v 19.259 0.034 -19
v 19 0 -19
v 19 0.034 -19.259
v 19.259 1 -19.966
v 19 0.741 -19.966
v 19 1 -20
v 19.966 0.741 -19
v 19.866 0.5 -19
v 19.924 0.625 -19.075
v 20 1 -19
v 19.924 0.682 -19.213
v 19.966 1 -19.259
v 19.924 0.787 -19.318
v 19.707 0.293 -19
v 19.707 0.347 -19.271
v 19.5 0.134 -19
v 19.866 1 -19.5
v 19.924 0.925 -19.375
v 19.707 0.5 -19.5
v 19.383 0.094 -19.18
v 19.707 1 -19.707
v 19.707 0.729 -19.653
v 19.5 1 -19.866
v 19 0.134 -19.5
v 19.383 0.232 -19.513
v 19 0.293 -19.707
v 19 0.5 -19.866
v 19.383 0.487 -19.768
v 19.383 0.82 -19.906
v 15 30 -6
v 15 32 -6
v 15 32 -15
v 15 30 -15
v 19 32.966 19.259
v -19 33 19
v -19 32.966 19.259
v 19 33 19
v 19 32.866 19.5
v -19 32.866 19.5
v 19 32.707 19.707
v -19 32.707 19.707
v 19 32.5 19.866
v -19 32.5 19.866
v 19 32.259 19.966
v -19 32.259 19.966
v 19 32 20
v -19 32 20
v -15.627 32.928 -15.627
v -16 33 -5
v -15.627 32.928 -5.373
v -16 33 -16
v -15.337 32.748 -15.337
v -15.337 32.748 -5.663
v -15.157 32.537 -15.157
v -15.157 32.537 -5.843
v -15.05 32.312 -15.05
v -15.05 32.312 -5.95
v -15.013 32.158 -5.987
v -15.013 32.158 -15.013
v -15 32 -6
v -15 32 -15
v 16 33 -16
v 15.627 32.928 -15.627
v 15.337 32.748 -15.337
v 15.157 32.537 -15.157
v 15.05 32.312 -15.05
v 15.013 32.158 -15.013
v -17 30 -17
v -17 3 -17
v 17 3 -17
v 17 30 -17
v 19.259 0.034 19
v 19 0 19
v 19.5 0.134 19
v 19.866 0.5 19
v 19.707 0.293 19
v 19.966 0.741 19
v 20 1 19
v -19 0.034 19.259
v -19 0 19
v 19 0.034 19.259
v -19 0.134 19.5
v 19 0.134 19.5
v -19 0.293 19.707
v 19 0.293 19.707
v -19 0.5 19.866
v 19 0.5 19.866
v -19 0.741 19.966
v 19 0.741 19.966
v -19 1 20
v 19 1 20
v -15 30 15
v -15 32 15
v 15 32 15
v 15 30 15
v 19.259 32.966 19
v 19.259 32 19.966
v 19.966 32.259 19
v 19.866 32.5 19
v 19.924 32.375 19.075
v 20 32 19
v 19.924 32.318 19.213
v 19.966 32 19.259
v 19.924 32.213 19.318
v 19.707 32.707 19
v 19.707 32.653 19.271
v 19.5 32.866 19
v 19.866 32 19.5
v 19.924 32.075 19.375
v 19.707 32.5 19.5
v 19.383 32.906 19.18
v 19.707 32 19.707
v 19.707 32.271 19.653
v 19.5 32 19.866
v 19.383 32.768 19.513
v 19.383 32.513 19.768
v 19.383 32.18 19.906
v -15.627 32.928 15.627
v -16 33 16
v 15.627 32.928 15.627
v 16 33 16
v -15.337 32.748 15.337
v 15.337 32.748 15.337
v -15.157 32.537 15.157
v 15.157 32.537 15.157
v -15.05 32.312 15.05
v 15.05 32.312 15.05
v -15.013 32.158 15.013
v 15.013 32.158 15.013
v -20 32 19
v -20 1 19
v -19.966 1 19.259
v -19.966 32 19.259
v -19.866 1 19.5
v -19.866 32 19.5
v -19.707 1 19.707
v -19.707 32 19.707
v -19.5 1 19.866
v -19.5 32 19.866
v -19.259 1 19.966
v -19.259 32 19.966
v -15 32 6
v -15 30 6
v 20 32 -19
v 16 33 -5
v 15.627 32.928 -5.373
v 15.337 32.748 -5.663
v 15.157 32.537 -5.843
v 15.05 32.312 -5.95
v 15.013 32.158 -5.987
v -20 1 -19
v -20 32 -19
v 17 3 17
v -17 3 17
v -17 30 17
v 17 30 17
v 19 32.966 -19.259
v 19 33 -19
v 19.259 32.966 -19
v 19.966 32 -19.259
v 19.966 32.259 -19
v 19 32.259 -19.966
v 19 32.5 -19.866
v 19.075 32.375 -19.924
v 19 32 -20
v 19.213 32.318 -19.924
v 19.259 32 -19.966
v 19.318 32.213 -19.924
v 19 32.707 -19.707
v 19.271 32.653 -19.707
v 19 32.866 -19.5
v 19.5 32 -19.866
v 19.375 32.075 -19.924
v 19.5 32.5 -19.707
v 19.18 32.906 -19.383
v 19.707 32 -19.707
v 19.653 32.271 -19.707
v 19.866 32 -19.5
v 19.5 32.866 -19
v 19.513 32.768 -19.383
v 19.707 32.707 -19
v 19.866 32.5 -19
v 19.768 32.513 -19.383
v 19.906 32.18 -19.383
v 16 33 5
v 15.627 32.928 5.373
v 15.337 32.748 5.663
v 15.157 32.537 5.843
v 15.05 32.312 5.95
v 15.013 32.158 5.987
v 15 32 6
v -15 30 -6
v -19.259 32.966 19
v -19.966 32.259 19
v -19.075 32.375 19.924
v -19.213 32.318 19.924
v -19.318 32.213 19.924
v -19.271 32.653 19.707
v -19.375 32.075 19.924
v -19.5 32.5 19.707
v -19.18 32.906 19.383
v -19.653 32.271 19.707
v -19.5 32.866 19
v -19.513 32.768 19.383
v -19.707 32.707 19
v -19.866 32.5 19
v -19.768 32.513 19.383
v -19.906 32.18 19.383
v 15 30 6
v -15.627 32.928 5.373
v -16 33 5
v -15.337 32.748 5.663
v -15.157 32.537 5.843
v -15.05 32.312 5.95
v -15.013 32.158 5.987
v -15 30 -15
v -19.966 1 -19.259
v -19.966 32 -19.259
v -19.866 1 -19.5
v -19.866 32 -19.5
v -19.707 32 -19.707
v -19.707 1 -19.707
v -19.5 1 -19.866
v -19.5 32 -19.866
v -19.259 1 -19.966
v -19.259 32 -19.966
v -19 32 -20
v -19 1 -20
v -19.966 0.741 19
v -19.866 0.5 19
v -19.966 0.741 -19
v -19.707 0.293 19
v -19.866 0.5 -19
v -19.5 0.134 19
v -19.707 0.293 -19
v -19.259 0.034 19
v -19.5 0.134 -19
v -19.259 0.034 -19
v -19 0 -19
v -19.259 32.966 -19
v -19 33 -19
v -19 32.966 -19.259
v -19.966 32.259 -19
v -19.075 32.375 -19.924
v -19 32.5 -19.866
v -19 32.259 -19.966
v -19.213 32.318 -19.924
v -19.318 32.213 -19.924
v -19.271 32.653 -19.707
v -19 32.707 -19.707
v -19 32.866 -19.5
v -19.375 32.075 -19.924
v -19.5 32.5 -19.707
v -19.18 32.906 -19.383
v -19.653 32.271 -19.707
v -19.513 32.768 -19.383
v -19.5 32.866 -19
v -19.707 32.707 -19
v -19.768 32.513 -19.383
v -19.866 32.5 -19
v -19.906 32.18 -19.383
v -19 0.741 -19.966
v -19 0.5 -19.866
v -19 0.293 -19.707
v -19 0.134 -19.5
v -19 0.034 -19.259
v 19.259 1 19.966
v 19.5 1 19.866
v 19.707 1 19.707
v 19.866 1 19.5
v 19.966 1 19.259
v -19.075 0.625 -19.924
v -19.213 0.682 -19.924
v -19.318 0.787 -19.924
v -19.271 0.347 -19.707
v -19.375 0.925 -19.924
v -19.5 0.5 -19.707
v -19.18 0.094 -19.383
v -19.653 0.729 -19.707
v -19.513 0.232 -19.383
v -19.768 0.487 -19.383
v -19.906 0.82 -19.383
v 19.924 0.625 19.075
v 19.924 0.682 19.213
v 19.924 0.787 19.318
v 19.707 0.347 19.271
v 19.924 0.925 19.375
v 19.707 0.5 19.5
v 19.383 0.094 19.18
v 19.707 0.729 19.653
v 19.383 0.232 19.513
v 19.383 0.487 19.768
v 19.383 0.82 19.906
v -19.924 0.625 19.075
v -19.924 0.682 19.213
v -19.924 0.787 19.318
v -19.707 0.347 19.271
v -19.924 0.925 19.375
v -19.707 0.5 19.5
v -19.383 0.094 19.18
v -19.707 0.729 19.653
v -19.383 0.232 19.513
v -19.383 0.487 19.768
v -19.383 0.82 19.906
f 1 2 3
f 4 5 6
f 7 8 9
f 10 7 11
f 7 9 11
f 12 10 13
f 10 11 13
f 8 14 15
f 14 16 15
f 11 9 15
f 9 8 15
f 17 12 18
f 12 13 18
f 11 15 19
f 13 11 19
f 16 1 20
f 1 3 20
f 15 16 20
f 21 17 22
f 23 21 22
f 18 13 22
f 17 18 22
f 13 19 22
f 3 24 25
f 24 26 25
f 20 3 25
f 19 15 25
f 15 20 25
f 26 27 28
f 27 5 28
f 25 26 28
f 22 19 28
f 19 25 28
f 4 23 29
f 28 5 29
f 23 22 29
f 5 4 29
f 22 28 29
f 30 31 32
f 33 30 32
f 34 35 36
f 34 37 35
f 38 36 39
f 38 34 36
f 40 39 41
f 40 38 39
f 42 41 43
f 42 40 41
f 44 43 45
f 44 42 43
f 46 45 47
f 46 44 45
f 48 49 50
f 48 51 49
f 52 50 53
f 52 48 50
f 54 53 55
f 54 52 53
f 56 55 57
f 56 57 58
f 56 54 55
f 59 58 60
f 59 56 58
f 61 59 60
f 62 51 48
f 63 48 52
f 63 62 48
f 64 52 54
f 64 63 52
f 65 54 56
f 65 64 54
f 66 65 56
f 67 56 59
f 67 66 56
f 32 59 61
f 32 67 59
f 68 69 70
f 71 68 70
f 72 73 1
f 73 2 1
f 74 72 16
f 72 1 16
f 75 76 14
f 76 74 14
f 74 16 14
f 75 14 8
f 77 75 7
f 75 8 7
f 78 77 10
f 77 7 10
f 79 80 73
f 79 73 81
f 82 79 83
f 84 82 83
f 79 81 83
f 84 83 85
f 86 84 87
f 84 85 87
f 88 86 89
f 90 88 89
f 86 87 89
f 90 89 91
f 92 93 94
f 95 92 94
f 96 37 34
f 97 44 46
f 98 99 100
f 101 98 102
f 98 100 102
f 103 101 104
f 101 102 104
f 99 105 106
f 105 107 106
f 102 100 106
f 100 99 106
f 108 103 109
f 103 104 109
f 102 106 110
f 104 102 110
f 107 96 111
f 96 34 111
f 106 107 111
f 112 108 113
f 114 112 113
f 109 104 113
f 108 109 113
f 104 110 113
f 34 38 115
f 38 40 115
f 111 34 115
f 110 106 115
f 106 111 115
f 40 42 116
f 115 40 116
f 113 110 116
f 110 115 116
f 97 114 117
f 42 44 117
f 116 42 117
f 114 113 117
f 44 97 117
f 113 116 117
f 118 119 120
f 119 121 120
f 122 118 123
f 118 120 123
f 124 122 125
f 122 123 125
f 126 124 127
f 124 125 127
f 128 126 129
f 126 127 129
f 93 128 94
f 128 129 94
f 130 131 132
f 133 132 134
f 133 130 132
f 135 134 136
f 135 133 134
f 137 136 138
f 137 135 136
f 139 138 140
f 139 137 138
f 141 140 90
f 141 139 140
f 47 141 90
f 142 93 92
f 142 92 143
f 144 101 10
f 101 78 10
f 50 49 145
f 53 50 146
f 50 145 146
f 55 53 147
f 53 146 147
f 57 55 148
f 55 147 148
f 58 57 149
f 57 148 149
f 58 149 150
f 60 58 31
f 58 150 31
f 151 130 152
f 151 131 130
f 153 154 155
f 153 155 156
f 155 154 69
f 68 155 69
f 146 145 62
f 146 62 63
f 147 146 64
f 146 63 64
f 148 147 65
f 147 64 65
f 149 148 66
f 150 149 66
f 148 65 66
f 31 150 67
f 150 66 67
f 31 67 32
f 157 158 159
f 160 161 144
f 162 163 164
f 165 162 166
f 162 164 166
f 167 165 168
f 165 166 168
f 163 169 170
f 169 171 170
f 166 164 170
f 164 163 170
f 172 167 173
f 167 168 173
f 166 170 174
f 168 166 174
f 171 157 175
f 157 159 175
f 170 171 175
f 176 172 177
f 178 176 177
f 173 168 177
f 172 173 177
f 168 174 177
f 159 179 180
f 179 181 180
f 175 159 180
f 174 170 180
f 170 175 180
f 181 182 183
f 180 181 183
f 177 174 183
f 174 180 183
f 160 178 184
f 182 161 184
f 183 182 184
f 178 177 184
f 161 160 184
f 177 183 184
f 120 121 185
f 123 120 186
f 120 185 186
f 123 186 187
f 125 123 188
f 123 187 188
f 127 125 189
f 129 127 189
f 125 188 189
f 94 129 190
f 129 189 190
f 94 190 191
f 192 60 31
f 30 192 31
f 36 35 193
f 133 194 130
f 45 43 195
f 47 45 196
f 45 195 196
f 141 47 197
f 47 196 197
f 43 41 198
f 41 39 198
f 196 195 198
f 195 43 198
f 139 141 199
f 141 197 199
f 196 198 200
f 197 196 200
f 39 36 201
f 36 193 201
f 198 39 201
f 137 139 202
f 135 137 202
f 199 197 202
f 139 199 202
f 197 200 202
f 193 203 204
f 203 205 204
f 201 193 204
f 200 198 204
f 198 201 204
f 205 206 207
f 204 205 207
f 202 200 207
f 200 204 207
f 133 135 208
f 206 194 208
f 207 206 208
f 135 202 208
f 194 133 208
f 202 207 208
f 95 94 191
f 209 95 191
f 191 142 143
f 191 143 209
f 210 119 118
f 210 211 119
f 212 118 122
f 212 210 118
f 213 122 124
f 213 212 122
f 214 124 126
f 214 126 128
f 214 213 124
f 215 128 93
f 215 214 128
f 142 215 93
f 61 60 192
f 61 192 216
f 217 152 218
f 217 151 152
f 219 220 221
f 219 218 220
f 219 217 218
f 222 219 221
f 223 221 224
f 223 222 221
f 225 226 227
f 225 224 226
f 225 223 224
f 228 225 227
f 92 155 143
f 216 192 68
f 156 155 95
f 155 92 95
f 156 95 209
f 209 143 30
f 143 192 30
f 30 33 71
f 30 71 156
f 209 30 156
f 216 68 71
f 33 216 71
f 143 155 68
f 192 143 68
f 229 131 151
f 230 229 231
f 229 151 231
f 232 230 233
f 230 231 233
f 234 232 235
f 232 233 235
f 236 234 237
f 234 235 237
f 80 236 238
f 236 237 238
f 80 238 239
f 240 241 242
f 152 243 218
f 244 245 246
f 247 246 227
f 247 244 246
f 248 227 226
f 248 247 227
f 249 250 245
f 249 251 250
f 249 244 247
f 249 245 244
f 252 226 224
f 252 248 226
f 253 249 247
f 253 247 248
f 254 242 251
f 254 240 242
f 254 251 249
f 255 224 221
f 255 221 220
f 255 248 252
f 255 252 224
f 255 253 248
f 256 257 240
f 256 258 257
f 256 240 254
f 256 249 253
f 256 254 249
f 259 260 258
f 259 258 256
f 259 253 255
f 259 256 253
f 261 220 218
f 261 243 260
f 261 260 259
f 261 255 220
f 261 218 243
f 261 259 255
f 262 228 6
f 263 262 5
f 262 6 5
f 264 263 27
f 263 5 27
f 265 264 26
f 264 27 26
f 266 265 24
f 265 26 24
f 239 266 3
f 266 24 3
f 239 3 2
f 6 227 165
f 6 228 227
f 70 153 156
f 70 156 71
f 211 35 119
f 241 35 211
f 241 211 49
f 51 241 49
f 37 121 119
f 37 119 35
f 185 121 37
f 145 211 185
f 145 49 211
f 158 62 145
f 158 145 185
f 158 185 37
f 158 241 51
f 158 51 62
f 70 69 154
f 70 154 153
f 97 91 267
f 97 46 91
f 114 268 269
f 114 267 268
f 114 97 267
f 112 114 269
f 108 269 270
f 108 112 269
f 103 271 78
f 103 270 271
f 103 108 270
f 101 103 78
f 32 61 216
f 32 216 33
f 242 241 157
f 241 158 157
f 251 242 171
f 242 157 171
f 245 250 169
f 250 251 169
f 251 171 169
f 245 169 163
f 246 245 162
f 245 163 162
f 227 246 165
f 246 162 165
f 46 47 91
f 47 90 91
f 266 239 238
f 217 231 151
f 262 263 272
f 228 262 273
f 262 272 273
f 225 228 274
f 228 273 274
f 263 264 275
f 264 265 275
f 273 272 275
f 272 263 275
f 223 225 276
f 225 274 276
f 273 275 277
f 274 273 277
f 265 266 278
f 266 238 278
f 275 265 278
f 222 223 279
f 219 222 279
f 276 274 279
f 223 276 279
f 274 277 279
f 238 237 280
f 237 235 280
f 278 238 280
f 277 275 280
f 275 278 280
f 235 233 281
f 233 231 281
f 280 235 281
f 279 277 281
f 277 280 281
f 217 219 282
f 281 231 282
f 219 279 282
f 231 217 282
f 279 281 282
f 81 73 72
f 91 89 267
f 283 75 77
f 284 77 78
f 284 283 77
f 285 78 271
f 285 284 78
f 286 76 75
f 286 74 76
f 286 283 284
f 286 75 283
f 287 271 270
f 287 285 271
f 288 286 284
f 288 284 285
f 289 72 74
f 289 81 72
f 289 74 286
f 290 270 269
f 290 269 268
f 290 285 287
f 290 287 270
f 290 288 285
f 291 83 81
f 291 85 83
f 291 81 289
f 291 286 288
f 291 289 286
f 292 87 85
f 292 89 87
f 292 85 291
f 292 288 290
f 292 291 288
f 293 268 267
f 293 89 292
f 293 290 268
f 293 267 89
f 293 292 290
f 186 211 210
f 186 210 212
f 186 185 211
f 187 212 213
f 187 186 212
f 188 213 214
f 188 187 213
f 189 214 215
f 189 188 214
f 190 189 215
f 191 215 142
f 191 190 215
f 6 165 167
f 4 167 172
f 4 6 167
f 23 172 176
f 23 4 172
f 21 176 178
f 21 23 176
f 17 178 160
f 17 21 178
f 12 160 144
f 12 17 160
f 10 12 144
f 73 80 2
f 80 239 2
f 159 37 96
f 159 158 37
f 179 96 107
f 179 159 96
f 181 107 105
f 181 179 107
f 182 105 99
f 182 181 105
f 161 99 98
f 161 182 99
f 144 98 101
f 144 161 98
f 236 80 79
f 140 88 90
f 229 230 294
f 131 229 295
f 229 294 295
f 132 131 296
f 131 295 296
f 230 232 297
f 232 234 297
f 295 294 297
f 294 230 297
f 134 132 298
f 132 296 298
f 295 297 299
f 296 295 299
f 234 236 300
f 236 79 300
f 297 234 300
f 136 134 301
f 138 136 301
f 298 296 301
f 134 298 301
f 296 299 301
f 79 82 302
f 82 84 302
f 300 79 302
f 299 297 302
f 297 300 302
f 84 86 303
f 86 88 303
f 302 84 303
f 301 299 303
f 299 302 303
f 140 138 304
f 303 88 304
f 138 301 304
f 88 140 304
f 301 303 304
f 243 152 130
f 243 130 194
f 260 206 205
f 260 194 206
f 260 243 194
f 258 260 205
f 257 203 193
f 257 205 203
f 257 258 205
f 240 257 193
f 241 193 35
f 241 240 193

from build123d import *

# Parameters (mm, degrees)
SKETCH1_W           = 40
SKETCH1_H           = 40
BOSS_EXTRUDE1_DEPTH = 30
SHELL1_T            = -3
SKETCH2_W           = 40
SKETCH2_H           = 40
BOSS_EXTRUDE2_DEPTH = 3
SKETCH3_W           = 30
SKETCH3_H           = 9
CUT_EXTRUDE1_DEPTH  = 3
FILLET1_R           = 1


with BuildPart() as part:
    # Sketch1 → Boss-Extrude1 (new body)
    with BuildSketch(Plane(origin=(0, 0, 0), x_dir=(1, 0, 0), z_dir=(0, 1, 0))):
        Rectangle(SKETCH1_W, SKETCH1_H)
    extrude(amount=BOSS_EXTRUDE1_DEPTH)

    # Shell1
    shell1_openings = [part.faces().sort_by_distance(p)[0] for p in [
        (0, 30, 0),
    ]]
    offset(amount=SHELL1_T, openings=shell1_openings, kind=Kind.INTERSECTION)

    # Sketch2 → Boss-Extrude2 (add)
    with BuildSketch(Plane(origin=(0, 30, 0), x_dir=(1, 0, 0), z_dir=(0, 1, 0))):
        Rectangle(SKETCH2_W, SKETCH2_H)
    extrude(amount=BOSS_EXTRUDE2_DEPTH)

    # Sketch3 → Cut-Extrude1 (cut)
    with BuildSketch(Plane(origin=(0, 33, 0), x_dir=(1, 0, 0), z_dir=(0, 1, 0))):
        with Locations((0, -10.5)):
            Rectangle(SKETCH3_W, SKETCH3_H)
        with Locations((0, 10.5)):
            Rectangle(SKETCH3_W, SKETCH3_H)
    extrude(amount=-CUT_EXTRUDE1_DEPTH, mode=Mode.SUBTRACT)

    # Fillet1
    fillet1_edges = [part.edges().sort_by_distance(p)[0] for p in [
        (-20, 33, 0),
        (0, 33, 20),
        (20, 33, 0),
        (0, 33, -20),
        (0, 0, 20),
        (-15, 33, 10.5),
        (0, 33, 15),
        (15, 33, 10.5),
        (0, 33, 6),
        (-20, 0, 0),
        (-15, 33, -10.5),
        (0, 33, -6),
        (15, 33, -10.5),
        (0, 0, -20),
        (0, 33, -15),
        (20, 0, 0),
        (20, 16.5, 20),
        (-20, 16.5, 20),
        (-20, 16.5, -20),
        (20, 16.5, -20),
    ]]
    fillet(fillet1_edges, radius=FILLET1_R)


solid = part.part
